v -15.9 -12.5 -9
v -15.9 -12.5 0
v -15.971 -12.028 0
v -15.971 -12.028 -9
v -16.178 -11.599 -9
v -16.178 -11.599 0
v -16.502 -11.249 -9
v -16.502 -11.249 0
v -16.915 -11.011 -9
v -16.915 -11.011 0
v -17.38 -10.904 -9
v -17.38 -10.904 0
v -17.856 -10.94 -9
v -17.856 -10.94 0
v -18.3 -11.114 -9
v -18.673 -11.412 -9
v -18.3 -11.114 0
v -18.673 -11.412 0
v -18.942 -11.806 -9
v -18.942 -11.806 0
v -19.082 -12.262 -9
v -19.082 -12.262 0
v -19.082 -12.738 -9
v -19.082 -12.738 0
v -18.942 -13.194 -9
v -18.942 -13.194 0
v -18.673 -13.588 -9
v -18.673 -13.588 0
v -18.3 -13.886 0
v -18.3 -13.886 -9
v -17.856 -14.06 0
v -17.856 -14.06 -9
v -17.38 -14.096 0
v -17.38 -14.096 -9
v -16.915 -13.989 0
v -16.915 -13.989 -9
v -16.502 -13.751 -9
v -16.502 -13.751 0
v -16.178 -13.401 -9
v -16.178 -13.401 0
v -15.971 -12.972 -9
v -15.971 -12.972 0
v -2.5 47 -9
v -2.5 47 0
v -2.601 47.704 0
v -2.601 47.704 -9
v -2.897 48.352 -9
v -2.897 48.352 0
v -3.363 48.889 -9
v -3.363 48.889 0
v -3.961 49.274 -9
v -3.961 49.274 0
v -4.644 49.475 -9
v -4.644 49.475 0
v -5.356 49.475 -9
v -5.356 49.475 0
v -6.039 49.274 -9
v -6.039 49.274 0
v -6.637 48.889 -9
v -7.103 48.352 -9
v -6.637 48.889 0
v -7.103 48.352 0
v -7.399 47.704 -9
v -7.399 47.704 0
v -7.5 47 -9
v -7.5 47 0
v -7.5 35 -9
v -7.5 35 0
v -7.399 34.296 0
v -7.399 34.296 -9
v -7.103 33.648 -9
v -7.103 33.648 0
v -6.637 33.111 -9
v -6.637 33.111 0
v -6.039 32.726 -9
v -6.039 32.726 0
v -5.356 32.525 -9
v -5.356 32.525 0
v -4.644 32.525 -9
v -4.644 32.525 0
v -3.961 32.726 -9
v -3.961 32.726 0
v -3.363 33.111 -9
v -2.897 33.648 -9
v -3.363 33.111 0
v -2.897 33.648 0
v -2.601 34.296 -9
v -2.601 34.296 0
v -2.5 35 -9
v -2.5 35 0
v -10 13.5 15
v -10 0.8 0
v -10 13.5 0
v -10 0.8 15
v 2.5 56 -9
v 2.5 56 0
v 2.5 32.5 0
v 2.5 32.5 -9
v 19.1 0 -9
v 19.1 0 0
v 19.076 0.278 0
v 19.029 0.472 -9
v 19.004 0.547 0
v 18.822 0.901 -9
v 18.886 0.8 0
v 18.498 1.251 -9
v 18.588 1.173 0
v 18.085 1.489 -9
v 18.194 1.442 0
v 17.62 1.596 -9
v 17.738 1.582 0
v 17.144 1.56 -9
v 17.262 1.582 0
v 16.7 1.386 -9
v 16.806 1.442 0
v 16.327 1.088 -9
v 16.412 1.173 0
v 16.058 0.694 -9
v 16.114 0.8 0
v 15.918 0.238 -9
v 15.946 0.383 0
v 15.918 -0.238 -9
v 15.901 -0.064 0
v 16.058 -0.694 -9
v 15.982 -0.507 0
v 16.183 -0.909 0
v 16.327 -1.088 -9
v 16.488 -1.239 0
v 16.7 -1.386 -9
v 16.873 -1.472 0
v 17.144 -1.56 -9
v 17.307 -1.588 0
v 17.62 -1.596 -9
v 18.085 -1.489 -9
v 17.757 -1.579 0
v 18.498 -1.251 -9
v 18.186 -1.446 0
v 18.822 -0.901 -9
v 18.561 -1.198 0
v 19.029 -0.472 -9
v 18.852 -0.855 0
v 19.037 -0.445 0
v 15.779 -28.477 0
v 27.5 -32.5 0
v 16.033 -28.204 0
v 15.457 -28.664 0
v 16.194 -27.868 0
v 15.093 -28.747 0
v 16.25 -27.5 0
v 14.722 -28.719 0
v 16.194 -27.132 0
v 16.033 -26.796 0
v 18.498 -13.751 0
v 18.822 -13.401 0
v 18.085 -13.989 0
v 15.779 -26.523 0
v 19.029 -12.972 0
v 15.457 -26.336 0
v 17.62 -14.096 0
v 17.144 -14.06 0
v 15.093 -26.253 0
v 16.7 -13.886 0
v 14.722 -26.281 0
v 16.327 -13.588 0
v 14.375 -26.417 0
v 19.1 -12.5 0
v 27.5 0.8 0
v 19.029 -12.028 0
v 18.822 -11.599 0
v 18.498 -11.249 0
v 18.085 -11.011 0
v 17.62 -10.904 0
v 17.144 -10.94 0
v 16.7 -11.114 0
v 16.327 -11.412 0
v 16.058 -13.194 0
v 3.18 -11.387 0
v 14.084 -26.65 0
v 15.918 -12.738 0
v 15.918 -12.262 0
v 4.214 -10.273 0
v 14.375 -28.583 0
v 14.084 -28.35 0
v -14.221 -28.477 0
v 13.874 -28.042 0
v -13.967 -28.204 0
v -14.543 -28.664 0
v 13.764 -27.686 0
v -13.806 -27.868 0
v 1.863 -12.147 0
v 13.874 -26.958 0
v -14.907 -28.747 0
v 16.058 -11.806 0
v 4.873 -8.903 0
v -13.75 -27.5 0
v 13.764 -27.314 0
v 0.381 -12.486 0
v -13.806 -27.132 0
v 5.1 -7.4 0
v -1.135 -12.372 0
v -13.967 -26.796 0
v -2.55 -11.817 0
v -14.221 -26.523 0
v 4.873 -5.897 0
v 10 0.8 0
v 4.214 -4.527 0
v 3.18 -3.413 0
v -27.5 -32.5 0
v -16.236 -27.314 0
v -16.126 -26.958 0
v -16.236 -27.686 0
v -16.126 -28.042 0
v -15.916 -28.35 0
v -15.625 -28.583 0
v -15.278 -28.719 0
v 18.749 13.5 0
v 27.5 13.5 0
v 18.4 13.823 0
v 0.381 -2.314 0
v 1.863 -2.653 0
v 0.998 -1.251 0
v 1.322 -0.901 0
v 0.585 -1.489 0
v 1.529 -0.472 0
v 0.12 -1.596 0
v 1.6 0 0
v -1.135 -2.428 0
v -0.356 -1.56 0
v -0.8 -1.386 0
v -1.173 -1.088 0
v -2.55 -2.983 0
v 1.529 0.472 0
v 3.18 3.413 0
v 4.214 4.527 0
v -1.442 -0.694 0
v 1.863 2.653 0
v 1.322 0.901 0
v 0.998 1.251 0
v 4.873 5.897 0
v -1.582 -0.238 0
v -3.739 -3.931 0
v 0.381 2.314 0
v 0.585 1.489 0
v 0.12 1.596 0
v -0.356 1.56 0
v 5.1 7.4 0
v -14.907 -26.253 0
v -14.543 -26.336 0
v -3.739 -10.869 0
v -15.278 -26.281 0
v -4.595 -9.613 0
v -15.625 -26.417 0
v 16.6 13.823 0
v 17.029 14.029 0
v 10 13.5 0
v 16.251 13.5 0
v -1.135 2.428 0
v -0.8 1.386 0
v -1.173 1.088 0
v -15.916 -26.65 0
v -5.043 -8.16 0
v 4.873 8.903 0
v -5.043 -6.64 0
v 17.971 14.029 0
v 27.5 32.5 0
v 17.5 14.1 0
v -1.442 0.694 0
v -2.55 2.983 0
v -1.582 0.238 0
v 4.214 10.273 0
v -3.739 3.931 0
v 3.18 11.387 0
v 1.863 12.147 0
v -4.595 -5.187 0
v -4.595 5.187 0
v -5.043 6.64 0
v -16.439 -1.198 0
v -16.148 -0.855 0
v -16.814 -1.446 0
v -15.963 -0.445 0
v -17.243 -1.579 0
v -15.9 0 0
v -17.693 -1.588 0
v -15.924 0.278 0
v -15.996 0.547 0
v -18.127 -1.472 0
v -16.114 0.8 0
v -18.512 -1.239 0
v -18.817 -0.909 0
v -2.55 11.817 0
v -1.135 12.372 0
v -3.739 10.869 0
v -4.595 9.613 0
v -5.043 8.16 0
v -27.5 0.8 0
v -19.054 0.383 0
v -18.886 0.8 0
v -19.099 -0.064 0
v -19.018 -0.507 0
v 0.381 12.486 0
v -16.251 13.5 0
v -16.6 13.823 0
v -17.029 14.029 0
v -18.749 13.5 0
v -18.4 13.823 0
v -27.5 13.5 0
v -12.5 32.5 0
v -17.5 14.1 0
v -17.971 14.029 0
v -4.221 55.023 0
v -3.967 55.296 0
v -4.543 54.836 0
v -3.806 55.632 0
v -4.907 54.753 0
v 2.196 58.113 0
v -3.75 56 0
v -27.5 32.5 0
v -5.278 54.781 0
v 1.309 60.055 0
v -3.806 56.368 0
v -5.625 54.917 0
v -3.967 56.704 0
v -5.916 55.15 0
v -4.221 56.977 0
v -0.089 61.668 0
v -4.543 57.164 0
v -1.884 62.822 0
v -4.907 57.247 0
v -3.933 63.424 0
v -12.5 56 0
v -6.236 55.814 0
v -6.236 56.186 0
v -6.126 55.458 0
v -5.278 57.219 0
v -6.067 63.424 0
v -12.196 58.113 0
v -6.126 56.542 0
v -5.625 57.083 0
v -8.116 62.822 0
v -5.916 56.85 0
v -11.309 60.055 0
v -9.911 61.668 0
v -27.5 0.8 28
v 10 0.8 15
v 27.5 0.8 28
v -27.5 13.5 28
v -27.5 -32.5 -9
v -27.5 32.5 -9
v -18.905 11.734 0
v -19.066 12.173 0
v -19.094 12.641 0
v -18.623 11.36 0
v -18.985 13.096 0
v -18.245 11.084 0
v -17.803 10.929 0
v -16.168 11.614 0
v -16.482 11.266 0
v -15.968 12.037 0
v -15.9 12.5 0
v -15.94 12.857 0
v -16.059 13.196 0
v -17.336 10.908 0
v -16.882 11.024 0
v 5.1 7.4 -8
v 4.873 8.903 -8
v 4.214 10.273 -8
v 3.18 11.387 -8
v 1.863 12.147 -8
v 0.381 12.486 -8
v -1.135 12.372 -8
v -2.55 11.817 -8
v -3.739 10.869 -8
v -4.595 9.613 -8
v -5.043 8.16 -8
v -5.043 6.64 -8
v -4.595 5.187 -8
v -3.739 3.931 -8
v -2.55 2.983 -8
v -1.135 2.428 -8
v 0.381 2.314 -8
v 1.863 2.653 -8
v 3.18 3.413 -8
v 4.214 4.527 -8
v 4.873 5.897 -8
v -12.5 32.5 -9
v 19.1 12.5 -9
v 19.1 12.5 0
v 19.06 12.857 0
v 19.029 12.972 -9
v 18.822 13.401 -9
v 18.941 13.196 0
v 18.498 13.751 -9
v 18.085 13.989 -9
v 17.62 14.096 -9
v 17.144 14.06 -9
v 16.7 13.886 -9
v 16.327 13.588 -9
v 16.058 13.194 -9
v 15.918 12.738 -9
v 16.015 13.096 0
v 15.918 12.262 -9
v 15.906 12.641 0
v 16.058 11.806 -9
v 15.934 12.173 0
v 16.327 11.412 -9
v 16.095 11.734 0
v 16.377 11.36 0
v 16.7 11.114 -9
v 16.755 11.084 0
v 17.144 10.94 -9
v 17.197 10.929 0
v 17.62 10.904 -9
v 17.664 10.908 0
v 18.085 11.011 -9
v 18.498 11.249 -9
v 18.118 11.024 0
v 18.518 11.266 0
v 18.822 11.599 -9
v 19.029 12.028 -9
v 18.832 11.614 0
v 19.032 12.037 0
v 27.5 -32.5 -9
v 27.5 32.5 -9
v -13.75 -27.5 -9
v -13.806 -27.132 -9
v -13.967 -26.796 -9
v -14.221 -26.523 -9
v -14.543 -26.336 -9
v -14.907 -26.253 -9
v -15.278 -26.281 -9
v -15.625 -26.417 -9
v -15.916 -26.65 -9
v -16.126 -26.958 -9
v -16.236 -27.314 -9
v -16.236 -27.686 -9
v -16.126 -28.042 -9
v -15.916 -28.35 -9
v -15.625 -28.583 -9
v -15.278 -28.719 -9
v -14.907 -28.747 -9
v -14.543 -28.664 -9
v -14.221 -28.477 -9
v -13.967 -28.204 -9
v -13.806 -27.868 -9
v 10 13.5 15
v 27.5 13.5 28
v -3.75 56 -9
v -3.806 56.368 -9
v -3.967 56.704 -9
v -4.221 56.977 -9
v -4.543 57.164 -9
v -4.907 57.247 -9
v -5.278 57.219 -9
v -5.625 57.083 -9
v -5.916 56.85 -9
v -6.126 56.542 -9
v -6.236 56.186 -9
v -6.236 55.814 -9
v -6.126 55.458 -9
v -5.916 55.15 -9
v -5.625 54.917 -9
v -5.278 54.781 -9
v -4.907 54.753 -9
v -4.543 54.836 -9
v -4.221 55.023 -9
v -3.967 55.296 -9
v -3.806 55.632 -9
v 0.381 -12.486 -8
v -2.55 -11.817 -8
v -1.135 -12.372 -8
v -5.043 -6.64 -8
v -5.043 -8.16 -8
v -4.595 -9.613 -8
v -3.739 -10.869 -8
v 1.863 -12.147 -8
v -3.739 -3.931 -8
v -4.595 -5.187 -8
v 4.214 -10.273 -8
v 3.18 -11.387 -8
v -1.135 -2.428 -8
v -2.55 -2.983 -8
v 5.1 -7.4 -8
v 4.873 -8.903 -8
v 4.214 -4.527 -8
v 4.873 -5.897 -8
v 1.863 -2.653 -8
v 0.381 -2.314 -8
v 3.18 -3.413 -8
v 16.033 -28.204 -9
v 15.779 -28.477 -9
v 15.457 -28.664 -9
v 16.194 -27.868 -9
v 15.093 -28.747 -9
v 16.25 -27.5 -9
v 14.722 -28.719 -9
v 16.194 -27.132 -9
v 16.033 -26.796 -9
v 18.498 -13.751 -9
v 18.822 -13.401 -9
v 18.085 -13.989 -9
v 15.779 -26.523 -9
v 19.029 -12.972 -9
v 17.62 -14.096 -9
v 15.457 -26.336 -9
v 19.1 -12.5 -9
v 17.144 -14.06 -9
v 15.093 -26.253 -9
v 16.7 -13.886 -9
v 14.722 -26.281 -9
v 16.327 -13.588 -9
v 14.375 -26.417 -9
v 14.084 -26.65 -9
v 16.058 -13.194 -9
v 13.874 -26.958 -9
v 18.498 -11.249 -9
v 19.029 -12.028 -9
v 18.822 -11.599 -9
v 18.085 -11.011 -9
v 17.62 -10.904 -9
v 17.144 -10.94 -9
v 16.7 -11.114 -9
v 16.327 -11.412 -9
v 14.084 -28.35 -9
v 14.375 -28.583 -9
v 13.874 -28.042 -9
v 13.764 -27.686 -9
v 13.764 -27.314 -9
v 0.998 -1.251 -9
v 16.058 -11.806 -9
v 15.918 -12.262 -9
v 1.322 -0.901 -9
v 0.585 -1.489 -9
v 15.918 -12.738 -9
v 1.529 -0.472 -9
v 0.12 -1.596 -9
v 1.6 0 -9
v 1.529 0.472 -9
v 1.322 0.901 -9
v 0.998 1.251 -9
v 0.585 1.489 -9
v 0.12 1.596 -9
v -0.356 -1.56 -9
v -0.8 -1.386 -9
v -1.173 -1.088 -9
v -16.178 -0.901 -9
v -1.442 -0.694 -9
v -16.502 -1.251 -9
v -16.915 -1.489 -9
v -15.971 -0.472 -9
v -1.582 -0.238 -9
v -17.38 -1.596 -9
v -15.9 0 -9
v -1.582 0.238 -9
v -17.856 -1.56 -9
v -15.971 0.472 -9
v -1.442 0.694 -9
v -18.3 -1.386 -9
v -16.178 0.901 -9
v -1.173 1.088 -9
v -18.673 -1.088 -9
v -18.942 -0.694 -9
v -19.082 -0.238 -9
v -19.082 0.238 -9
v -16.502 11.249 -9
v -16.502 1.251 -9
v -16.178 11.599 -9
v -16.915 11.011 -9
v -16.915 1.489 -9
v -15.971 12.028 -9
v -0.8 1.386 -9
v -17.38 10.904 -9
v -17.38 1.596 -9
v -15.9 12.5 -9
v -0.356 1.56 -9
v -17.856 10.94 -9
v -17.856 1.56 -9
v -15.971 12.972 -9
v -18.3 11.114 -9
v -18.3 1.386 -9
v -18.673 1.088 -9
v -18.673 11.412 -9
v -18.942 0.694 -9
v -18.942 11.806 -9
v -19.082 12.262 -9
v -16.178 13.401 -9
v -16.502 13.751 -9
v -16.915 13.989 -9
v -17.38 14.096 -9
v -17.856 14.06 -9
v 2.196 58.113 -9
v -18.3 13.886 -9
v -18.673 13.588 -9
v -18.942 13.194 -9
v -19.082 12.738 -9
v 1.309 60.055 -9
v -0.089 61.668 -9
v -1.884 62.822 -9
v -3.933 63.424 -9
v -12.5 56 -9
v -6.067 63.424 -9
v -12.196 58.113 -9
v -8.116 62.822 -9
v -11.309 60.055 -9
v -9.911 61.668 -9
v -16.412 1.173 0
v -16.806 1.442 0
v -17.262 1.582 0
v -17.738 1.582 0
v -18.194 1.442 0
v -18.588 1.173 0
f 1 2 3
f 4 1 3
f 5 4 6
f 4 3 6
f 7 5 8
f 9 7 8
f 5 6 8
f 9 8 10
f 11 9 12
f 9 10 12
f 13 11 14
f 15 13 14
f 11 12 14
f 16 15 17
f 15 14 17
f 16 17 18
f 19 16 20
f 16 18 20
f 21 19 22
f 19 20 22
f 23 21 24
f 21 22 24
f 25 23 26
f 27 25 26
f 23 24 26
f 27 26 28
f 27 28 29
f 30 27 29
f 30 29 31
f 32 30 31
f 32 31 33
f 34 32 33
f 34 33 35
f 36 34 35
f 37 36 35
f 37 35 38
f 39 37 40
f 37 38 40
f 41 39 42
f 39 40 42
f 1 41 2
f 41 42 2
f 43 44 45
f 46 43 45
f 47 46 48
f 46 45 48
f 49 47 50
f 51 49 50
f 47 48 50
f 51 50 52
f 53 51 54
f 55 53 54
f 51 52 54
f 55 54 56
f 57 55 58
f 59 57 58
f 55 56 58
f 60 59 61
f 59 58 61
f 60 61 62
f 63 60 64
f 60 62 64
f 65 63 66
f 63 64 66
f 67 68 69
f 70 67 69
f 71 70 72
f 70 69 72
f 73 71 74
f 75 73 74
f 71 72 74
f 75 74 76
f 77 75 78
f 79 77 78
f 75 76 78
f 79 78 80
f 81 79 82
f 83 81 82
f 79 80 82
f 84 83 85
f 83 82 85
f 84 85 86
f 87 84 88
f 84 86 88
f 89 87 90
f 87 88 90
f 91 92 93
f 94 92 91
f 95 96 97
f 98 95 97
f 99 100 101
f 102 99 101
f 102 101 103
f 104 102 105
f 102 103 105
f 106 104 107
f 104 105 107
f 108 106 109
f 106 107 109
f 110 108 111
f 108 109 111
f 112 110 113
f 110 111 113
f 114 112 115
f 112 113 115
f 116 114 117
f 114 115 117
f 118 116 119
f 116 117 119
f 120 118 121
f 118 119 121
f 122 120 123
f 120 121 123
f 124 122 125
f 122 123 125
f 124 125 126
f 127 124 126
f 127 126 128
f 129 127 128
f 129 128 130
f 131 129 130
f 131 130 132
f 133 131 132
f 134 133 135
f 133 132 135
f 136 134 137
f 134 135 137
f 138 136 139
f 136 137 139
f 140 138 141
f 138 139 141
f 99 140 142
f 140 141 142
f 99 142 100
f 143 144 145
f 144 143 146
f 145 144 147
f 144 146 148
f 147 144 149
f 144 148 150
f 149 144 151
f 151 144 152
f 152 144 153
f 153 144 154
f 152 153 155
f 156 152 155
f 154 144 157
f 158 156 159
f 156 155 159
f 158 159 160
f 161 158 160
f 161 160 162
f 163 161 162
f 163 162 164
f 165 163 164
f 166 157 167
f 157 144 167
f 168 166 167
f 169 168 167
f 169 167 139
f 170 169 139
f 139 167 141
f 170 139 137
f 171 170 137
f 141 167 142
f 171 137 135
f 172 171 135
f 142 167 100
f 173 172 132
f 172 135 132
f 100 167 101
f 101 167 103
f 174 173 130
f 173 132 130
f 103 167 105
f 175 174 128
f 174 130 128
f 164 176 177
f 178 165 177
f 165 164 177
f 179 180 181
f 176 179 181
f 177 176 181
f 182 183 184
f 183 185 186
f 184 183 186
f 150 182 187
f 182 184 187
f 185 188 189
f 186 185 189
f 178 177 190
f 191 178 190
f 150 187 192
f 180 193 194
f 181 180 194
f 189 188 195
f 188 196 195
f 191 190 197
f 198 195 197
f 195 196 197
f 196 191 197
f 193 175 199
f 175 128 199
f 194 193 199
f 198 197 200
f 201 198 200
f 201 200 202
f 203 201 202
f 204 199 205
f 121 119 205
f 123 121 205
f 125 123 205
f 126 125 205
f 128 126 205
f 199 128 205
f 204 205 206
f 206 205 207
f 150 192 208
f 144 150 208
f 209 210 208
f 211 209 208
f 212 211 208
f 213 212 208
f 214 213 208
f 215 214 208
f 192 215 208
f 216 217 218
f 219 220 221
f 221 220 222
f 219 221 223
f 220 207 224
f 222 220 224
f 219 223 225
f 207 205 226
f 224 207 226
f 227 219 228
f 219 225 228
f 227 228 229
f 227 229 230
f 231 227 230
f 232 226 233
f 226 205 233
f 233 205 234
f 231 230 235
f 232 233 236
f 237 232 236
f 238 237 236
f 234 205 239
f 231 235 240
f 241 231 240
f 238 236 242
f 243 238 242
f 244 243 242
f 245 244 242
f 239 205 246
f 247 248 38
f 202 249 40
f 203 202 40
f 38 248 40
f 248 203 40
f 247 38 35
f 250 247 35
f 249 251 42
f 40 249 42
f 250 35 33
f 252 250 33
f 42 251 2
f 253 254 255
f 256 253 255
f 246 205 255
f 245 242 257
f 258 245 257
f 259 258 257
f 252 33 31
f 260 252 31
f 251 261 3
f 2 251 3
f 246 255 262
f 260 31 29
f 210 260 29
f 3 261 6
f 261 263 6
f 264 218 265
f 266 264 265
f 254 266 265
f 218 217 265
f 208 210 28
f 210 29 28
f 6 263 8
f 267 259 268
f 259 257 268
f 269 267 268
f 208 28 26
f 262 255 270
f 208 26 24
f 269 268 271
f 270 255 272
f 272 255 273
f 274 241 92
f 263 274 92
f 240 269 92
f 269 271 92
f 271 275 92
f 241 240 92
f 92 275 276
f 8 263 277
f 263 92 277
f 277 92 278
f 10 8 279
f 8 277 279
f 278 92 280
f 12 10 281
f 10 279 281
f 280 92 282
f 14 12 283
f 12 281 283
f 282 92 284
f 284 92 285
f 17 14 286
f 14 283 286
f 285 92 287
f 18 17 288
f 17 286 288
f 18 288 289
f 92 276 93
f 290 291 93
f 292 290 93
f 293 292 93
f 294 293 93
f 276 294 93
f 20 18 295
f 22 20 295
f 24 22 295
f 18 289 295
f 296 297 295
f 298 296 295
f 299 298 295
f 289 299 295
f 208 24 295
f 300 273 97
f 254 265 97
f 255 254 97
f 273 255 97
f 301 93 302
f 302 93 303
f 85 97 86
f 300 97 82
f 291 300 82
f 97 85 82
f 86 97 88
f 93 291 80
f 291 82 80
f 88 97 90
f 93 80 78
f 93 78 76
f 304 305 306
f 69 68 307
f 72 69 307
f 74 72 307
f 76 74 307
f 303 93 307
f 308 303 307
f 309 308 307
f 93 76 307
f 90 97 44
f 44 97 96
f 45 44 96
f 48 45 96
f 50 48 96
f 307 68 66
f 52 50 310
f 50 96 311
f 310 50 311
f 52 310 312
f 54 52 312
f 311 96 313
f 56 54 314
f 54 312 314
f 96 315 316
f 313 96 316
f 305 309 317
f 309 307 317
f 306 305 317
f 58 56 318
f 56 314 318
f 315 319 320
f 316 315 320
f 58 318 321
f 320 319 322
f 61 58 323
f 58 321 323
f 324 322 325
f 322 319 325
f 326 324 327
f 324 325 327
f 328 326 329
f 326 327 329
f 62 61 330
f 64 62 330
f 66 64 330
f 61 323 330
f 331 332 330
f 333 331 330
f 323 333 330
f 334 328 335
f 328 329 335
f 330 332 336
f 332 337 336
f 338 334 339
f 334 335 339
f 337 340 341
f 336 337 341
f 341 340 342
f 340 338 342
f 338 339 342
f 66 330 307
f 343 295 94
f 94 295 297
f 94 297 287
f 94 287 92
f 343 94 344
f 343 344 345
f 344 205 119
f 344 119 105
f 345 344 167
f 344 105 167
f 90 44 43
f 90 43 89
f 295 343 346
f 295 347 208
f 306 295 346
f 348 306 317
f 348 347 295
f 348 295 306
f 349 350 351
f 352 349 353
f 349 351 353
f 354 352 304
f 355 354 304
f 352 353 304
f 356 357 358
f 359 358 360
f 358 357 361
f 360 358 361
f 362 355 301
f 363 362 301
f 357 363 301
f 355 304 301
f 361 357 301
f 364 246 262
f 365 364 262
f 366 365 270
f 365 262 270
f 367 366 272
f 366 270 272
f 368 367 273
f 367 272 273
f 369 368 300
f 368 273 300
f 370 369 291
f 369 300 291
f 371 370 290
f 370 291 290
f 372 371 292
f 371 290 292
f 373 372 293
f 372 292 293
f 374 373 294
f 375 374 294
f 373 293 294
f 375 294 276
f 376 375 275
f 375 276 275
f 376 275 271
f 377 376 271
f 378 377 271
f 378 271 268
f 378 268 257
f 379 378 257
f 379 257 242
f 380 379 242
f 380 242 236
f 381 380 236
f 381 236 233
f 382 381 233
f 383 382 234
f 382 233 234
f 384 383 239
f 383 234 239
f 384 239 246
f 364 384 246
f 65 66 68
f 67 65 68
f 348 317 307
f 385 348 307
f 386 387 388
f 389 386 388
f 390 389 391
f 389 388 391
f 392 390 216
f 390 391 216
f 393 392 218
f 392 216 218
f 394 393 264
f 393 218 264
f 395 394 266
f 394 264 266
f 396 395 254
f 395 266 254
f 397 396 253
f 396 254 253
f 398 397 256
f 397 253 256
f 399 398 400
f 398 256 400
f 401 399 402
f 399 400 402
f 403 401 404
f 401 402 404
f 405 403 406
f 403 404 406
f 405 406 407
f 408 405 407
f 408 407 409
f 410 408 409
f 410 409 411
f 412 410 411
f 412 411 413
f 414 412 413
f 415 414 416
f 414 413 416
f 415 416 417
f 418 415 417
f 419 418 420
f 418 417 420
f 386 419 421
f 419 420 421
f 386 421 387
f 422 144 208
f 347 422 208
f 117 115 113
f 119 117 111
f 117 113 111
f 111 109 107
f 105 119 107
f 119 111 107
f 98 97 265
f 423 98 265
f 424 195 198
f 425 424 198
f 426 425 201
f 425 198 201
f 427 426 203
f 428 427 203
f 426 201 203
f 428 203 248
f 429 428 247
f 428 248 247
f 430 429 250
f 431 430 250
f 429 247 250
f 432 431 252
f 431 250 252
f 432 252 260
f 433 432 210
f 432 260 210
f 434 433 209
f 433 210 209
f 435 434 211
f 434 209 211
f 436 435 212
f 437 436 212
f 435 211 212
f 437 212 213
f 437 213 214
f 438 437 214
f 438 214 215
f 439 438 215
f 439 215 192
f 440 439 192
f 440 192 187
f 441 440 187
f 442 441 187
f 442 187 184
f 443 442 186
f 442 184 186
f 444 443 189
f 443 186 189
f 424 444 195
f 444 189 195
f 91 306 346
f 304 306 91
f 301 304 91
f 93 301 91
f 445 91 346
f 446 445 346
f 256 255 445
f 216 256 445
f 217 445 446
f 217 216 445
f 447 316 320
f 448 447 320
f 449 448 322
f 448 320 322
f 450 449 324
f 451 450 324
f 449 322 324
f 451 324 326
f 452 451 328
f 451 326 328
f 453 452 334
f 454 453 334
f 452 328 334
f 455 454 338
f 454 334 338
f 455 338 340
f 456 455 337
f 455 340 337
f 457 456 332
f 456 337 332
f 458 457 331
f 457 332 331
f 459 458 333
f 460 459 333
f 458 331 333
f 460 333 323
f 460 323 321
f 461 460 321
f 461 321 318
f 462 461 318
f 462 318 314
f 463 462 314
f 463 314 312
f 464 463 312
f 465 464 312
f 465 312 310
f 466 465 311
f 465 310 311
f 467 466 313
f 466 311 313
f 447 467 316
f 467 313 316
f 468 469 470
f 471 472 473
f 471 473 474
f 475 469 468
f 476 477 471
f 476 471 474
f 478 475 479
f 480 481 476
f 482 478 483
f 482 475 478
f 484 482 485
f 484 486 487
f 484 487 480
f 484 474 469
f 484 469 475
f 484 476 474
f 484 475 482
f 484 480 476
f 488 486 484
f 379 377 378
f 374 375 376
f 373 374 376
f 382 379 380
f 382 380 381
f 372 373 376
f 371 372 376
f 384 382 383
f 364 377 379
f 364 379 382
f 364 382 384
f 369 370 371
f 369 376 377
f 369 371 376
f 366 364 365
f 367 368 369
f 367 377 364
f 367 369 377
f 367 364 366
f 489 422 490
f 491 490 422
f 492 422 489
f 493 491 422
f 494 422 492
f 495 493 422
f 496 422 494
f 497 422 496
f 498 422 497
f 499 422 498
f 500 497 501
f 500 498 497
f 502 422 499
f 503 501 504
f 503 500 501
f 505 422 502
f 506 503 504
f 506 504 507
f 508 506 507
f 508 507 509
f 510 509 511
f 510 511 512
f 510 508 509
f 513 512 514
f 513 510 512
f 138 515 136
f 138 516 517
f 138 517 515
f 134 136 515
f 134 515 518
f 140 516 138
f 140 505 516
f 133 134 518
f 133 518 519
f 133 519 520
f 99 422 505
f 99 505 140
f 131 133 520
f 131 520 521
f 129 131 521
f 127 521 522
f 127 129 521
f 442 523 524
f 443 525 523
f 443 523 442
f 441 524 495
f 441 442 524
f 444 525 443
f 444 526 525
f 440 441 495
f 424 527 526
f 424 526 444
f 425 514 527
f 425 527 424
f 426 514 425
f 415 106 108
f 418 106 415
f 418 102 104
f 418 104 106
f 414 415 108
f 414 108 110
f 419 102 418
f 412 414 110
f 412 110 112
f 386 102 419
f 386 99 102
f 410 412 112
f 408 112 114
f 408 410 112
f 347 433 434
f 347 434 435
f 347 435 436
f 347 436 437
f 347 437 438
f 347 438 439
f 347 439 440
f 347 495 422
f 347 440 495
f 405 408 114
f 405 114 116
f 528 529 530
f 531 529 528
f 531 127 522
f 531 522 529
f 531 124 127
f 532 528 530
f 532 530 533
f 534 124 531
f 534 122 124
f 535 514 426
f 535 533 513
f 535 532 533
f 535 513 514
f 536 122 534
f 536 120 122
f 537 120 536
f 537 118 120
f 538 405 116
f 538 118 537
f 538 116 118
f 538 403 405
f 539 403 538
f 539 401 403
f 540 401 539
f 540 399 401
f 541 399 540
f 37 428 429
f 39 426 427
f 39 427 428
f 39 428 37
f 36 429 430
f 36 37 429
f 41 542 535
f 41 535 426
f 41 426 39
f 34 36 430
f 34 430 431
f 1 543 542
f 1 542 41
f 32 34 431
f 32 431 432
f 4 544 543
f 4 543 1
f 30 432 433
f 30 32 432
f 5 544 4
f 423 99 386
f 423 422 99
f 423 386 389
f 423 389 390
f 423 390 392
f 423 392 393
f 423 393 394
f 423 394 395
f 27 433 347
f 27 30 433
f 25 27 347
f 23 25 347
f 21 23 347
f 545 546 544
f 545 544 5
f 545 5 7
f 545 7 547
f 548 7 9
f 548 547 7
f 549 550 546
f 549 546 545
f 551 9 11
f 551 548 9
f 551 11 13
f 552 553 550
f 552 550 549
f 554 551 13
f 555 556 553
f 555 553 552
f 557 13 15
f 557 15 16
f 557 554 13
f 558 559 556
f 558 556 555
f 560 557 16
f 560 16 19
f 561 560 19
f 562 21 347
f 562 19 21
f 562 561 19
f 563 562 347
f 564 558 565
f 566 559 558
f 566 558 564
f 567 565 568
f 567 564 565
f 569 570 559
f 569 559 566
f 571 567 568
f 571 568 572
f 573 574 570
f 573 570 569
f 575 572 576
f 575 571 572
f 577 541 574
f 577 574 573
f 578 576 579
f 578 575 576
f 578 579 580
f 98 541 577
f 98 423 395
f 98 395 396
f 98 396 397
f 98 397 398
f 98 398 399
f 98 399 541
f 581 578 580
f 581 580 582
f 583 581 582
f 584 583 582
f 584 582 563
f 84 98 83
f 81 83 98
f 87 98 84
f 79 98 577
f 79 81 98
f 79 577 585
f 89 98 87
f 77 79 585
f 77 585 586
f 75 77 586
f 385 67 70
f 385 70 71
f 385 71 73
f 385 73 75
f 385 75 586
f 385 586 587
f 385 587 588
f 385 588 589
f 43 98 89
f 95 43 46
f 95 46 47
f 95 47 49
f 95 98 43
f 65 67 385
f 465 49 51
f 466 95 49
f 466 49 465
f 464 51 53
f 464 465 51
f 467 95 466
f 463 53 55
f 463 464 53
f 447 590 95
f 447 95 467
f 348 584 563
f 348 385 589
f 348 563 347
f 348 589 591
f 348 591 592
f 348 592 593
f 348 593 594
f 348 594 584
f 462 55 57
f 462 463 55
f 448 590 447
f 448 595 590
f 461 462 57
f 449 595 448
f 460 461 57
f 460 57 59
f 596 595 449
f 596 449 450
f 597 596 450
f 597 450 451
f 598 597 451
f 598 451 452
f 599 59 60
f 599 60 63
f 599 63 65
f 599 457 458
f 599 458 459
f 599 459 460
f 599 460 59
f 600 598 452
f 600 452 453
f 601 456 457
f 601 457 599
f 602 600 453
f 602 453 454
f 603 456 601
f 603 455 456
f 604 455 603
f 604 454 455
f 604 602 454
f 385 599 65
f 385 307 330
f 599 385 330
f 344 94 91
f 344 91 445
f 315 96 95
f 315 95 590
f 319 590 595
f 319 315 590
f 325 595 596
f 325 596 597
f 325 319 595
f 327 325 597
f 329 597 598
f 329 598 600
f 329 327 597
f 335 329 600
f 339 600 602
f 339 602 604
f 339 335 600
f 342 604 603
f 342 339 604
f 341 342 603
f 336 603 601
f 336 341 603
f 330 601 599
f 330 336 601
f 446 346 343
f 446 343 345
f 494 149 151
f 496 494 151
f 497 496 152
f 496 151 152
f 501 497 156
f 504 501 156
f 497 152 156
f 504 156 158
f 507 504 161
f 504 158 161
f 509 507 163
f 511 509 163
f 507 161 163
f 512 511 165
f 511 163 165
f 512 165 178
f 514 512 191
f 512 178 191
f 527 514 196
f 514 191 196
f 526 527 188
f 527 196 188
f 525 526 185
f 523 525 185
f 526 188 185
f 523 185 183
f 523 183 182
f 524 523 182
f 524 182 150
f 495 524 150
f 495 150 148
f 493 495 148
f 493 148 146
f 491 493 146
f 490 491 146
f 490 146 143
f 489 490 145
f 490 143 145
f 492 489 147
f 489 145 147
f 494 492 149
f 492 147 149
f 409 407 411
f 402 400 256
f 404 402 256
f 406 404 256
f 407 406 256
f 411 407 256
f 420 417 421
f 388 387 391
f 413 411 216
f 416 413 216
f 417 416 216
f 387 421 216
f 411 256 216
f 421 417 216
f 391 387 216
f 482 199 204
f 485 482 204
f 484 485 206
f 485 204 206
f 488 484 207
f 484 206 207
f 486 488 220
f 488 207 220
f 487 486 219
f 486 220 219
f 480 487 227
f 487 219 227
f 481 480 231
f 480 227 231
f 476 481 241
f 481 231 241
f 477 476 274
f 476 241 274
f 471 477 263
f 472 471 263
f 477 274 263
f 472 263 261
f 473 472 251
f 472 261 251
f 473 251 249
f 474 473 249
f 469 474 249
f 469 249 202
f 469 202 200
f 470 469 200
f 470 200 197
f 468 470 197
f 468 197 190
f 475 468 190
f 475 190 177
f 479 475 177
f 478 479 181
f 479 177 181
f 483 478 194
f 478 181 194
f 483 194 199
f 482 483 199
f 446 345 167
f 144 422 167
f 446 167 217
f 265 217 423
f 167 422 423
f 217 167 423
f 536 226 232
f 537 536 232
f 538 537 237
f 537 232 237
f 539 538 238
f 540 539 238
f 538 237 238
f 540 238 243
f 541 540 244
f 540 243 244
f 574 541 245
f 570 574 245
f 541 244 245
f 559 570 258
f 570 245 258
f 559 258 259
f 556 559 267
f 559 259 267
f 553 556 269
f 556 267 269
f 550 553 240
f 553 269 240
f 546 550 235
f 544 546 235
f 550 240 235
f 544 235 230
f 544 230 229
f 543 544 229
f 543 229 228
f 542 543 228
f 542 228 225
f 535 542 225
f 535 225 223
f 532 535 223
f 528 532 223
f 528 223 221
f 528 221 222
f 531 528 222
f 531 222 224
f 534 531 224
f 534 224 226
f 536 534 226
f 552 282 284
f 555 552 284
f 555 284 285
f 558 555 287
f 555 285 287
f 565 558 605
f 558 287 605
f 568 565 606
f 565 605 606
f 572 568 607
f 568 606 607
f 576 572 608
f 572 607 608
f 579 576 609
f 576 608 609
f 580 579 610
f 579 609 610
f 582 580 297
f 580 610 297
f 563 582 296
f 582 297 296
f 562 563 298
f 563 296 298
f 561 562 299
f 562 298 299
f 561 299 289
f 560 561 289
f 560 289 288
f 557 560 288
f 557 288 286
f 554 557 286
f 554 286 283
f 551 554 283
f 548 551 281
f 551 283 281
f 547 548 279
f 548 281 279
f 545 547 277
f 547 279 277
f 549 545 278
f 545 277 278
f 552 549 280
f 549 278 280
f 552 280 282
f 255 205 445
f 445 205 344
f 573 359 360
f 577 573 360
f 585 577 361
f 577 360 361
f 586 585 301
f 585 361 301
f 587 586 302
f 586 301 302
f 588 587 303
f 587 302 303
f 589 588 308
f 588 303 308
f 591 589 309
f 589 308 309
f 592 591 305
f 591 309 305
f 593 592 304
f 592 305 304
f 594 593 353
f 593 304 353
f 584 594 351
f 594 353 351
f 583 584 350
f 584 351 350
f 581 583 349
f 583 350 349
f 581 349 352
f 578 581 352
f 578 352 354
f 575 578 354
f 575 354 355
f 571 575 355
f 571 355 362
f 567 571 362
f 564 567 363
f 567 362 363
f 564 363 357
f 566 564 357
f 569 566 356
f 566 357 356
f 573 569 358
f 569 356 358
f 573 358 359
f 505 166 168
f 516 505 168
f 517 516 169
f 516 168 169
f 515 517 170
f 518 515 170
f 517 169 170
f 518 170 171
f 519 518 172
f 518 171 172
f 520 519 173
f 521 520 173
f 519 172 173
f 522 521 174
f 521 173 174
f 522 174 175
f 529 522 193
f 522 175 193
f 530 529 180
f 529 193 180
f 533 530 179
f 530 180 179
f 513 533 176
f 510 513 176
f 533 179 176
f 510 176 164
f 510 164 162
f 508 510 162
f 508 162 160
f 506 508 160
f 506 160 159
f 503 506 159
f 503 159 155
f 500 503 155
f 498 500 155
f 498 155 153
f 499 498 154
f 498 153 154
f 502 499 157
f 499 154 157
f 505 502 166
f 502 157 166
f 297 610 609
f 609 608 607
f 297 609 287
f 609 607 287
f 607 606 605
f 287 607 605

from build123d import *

# Parameters (mm, degrees)
SKETCH_R             = 1.25
SKETCH_R_2           = 1.6
PAD_DEPTH            = 9
SKETCH002_W          = 55
SKETCH002_H          = 12.7
PAD001_DEPTH         = 28
SKETCH003_W          = 20
SKETCH003_H          = 15
POCKET001_DEPTH      = 63.501
POCKET001_DEPTH_BACK = 32.501
SKETCH001_R          = 5.1
POCKET_DEPTH         = 8


with BuildPart() as part:
    # Sketch → Pad (new body)
    with BuildSketch(Plane.XY):
        with BuildLine():
            Line((-27.5, 32.5), (-12.5, 32.5))
            Line((-12.5, 32.5), (-12.5, 56))
            ThreePointArc((2.5, 56), (-5, 63.5), (-12.5, 56))
            Line((2.5, 56), (2.5, 32.5))
            Line((2.5, 32.5), (27.5, 32.5))
            Line((27.5, 32.5), (27.5, -32.5))
            Line((27.5, -32.5), (-27.5, -32.5))
            Line((-27.5, -32.5), (-27.5, 32.5))
        make_face()
        with Locations((-15, -27.5)):
            Circle(SKETCH_R, mode=Mode.SUBTRACT)
        with Locations((15, -27.5)):
            Circle(SKETCH_R, mode=Mode.SUBTRACT)
        with Locations((-5, 56)):
            Circle(SKETCH_R, mode=Mode.SUBTRACT)
        with Locations((-17.5, 12.5)):
            Circle(SKETCH_R_2, mode=Mode.SUBTRACT)
        with Locations((-17.5, -12.5)):
            Circle(SKETCH_R_2, mode=Mode.SUBTRACT)
        with Locations((17.5, 12.5)):
            Circle(SKETCH_R_2, mode=Mode.SUBTRACT)
        with Locations((17.5, -12.5)):
            Circle(SKETCH_R_2, mode=Mode.SUBTRACT)
        Circle(SKETCH_R_2, mode=Mode.SUBTRACT)
        with Locations((-17.5, 0)):
            Circle(SKETCH_R_2, mode=Mode.SUBTRACT)
        with Locations((17.5, 0)):
            Circle(SKETCH_R_2, mode=Mode.SUBTRACT)
        with BuildLine():
            ThreePointArc((-2.5, 47), (-5, 49.5), (-7.5, 47))
            Line((-7.5, 47), (-7.5, 35))
            ThreePointArc((-7.5, 35), (-5, 32.5), (-2.5, 35))
            Line((-2.5, 47), (-2.5, 35))
        make_face(mode=Mode.SUBTRACT)
    extrude(amount=-PAD_DEPTH)

    # Sketch002 → Pad001 (join)
    with BuildSketch(Plane.XY):
        with Locations((0, 7.15)):
            Rectangle(SKETCH002_W, SKETCH002_H)
    extrude(amount=PAD001_DEPTH)

    # Sketch003 → Pocket001 (cut, two sides)
    with BuildSketch(Plane.XZ) as pocket001_sk:
        with Locations((0, 7.5)):
            Rectangle(SKETCH003_W, SKETCH003_H)
    extrude(amount=-POCKET001_DEPTH, mode=Mode.SUBTRACT)
    extrude(pocket001_sk.sketch, amount=POCKET001_DEPTH_BACK, mode=Mode.SUBTRACT)

    # Sketch001 → Pocket (cut)
    with BuildSketch(Plane.XY):
        with Locations((0, 7.4)):
            Circle(SKETCH001_R)
        with Locations((0, -7.4)):
            Circle(SKETCH001_R)
    extrude(amount=-POCKET_DEPTH, mode=Mode.SUBTRACT)


solid = part.part
